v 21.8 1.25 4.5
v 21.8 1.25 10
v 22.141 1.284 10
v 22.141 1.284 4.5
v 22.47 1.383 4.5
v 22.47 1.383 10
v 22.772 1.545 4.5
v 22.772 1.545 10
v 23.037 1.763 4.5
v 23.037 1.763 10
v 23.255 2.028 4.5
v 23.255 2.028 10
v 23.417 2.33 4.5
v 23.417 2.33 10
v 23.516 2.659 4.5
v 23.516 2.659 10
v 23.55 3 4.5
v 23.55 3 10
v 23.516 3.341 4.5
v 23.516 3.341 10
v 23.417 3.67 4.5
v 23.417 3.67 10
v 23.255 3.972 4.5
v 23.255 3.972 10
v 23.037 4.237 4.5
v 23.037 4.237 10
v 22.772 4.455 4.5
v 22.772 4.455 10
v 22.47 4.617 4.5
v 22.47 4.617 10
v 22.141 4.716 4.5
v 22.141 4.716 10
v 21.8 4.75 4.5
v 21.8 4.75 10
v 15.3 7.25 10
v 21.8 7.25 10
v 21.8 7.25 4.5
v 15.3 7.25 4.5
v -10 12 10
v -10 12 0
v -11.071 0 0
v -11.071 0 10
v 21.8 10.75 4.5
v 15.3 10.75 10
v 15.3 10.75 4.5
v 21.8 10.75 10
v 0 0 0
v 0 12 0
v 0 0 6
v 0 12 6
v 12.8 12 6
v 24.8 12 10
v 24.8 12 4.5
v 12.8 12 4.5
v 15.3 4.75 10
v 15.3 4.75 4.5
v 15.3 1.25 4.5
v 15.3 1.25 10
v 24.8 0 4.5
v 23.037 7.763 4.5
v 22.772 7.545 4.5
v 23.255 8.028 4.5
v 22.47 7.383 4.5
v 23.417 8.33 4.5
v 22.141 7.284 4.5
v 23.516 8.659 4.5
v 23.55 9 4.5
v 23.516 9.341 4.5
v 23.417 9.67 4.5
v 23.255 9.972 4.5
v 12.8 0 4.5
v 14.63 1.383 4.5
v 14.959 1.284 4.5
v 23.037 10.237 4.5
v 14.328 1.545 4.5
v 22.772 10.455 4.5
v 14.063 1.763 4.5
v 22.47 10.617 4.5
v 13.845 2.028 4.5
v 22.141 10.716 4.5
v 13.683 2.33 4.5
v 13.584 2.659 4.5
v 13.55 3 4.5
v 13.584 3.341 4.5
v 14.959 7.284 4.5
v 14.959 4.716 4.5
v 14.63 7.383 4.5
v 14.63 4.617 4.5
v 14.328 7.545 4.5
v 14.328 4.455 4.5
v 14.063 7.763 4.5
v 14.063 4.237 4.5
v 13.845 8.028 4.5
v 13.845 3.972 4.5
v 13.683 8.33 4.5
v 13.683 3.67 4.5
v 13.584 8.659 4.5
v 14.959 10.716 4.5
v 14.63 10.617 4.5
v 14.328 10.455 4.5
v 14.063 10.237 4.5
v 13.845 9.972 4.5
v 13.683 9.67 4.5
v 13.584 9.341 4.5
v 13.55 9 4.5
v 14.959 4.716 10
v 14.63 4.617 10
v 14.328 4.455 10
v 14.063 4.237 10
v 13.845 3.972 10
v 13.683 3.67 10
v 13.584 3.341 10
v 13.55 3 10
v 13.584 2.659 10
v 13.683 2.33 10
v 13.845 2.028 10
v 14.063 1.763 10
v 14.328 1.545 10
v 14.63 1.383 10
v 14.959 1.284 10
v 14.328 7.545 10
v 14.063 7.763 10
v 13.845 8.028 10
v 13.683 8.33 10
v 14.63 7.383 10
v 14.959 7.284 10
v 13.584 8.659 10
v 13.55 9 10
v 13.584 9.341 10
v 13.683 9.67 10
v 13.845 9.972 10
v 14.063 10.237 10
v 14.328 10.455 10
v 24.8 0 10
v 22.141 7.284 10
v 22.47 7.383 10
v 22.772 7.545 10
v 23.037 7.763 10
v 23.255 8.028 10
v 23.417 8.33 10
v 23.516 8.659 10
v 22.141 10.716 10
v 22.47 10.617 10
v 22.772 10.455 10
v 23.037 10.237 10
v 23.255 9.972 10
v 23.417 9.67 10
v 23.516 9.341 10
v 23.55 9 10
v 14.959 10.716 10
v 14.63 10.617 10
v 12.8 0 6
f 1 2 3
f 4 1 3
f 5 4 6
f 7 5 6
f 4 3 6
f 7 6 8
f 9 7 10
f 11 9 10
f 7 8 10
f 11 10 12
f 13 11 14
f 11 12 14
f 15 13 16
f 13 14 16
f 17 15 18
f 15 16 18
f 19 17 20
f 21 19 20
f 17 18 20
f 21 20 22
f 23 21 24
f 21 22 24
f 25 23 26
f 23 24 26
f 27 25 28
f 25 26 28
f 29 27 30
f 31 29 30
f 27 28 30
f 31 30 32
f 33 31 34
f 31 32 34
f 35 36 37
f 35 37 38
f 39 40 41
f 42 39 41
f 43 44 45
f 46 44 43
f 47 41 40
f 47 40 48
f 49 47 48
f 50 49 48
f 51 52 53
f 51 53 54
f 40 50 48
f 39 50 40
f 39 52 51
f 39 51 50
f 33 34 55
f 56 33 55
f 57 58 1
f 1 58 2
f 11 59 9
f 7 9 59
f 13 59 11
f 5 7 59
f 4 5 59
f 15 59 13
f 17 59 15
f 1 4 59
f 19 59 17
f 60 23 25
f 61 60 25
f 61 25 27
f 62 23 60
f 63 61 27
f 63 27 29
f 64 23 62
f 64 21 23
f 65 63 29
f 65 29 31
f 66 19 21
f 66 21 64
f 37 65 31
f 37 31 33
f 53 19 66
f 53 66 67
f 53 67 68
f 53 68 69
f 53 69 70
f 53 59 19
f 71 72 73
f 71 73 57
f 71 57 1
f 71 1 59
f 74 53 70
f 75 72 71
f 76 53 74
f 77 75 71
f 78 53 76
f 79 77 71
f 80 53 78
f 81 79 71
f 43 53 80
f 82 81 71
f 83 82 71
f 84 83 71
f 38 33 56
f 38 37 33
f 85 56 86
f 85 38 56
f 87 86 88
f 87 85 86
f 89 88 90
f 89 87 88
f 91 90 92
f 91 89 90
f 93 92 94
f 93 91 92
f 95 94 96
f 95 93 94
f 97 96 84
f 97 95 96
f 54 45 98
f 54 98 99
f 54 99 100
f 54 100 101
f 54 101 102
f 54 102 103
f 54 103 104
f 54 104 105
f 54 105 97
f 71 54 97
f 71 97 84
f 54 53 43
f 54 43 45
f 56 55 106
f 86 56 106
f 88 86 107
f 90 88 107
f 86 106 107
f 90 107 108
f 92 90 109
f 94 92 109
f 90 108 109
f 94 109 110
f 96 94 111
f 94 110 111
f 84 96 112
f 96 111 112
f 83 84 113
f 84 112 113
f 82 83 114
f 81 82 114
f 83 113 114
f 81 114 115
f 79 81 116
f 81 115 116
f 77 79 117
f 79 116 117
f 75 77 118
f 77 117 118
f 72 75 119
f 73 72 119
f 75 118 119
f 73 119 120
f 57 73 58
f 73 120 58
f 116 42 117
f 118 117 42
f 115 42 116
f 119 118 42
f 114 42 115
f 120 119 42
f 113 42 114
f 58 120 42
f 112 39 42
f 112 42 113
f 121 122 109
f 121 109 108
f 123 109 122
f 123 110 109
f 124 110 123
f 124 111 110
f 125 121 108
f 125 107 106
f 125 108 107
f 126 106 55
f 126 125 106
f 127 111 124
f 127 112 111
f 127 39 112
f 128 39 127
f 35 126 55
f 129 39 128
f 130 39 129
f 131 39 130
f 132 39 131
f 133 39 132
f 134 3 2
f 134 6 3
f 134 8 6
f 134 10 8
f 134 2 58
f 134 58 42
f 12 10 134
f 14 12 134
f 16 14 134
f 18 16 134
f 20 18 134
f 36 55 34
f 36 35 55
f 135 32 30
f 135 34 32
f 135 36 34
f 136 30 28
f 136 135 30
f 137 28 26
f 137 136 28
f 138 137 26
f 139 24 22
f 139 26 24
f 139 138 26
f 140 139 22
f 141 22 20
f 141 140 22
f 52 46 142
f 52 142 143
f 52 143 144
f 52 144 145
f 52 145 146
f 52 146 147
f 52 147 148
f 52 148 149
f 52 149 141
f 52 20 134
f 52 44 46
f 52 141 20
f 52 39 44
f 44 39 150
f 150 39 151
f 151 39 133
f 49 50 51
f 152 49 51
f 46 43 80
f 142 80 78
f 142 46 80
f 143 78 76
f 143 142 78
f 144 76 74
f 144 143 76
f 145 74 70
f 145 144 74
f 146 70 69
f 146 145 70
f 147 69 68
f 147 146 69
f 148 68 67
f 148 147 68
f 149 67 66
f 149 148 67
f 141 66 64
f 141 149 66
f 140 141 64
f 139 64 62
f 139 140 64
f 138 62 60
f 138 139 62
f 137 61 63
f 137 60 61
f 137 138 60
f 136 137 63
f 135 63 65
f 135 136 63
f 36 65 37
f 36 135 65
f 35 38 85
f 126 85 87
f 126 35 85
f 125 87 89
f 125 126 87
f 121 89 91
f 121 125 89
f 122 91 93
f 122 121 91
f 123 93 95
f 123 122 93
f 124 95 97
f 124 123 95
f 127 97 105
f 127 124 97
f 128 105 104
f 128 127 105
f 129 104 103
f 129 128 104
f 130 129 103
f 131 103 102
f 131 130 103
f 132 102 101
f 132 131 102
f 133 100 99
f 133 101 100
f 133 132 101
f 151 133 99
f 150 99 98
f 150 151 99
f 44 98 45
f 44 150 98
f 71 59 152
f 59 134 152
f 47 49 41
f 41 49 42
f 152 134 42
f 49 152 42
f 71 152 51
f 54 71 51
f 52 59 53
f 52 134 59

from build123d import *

# Parameters (mm, degrees)
EXTRUDE_1_DEPTH     = 10
SKETCH_2_W          = 24.8
SKETCH_2_H          = 12
EXTRUDE_2_DEPTH     = 4
SKETCH_3_W          = 12
SKETCH_3_H          = 12
EXTRUDE_3_DEPTH     = 1.5
CUT_EXTRUDE_1_DEPTH = 30.309384163


with BuildPart() as part:
    # 草图1 → 凸台-拉伸1 (new body)
    with BuildSketch(Plane.XY):
        Polygon((0, 0), (0, 12), (-10, 12), (-11.070971468, 0), align=None)
    extrude(amount=EXTRUDE_1_DEPTH)

    # 草图2 → 凸台-拉伸2 (add)
    with BuildSketch(Plane.XY.offset(10)):
        with Locations((12.4, 6)):
            Rectangle(SKETCH_2_W, SKETCH_2_H)
    extrude(amount=-EXTRUDE_2_DEPTH)

    # 草图3 → 凸台-拉伸3 (add)
    with BuildSketch(Plane(origin=(0, 0, 6), x_dir=(-1, 0, 0), z_dir=(0, 0, -1))):
        with Locations((-18.8, 6)):
            Rectangle(SKETCH_3_W, SKETCH_3_H)
    extrude(amount=EXTRUDE_3_DEPTH)

    # 草图5 → 切除-拉伸1 (cut, through all)
    with BuildSketch(Plane.XY.offset(10)):
        with BuildLine():
            Line((21.8, 7.25), (15.3, 7.25))
            ThreePointArc((15.3, 7.25), (13.55, 9), (15.3, 10.75))
            Line((15.3, 10.75), (21.8, 10.75))
            ThreePointArc((21.8, 10.75), (23.55, 9), (21.8, 7.25))
        make_face()
        with BuildLine():
            Line((21.8, 4.75), (15.3, 4.75))
            ThreePointArc((15.3, 4.75), (13.55, 3), (15.3, 1.25))
            Line((15.3, 1.25), (21.8, 1.25))
            ThreePointArc((21.8, 1.25), (23.55, 3), (21.8, 4.75))
        make_face()
    extrude(amount=-CUT_EXTRUDE_1_DEPTH, mode=Mode.SUBTRACT)


solid = part.part
